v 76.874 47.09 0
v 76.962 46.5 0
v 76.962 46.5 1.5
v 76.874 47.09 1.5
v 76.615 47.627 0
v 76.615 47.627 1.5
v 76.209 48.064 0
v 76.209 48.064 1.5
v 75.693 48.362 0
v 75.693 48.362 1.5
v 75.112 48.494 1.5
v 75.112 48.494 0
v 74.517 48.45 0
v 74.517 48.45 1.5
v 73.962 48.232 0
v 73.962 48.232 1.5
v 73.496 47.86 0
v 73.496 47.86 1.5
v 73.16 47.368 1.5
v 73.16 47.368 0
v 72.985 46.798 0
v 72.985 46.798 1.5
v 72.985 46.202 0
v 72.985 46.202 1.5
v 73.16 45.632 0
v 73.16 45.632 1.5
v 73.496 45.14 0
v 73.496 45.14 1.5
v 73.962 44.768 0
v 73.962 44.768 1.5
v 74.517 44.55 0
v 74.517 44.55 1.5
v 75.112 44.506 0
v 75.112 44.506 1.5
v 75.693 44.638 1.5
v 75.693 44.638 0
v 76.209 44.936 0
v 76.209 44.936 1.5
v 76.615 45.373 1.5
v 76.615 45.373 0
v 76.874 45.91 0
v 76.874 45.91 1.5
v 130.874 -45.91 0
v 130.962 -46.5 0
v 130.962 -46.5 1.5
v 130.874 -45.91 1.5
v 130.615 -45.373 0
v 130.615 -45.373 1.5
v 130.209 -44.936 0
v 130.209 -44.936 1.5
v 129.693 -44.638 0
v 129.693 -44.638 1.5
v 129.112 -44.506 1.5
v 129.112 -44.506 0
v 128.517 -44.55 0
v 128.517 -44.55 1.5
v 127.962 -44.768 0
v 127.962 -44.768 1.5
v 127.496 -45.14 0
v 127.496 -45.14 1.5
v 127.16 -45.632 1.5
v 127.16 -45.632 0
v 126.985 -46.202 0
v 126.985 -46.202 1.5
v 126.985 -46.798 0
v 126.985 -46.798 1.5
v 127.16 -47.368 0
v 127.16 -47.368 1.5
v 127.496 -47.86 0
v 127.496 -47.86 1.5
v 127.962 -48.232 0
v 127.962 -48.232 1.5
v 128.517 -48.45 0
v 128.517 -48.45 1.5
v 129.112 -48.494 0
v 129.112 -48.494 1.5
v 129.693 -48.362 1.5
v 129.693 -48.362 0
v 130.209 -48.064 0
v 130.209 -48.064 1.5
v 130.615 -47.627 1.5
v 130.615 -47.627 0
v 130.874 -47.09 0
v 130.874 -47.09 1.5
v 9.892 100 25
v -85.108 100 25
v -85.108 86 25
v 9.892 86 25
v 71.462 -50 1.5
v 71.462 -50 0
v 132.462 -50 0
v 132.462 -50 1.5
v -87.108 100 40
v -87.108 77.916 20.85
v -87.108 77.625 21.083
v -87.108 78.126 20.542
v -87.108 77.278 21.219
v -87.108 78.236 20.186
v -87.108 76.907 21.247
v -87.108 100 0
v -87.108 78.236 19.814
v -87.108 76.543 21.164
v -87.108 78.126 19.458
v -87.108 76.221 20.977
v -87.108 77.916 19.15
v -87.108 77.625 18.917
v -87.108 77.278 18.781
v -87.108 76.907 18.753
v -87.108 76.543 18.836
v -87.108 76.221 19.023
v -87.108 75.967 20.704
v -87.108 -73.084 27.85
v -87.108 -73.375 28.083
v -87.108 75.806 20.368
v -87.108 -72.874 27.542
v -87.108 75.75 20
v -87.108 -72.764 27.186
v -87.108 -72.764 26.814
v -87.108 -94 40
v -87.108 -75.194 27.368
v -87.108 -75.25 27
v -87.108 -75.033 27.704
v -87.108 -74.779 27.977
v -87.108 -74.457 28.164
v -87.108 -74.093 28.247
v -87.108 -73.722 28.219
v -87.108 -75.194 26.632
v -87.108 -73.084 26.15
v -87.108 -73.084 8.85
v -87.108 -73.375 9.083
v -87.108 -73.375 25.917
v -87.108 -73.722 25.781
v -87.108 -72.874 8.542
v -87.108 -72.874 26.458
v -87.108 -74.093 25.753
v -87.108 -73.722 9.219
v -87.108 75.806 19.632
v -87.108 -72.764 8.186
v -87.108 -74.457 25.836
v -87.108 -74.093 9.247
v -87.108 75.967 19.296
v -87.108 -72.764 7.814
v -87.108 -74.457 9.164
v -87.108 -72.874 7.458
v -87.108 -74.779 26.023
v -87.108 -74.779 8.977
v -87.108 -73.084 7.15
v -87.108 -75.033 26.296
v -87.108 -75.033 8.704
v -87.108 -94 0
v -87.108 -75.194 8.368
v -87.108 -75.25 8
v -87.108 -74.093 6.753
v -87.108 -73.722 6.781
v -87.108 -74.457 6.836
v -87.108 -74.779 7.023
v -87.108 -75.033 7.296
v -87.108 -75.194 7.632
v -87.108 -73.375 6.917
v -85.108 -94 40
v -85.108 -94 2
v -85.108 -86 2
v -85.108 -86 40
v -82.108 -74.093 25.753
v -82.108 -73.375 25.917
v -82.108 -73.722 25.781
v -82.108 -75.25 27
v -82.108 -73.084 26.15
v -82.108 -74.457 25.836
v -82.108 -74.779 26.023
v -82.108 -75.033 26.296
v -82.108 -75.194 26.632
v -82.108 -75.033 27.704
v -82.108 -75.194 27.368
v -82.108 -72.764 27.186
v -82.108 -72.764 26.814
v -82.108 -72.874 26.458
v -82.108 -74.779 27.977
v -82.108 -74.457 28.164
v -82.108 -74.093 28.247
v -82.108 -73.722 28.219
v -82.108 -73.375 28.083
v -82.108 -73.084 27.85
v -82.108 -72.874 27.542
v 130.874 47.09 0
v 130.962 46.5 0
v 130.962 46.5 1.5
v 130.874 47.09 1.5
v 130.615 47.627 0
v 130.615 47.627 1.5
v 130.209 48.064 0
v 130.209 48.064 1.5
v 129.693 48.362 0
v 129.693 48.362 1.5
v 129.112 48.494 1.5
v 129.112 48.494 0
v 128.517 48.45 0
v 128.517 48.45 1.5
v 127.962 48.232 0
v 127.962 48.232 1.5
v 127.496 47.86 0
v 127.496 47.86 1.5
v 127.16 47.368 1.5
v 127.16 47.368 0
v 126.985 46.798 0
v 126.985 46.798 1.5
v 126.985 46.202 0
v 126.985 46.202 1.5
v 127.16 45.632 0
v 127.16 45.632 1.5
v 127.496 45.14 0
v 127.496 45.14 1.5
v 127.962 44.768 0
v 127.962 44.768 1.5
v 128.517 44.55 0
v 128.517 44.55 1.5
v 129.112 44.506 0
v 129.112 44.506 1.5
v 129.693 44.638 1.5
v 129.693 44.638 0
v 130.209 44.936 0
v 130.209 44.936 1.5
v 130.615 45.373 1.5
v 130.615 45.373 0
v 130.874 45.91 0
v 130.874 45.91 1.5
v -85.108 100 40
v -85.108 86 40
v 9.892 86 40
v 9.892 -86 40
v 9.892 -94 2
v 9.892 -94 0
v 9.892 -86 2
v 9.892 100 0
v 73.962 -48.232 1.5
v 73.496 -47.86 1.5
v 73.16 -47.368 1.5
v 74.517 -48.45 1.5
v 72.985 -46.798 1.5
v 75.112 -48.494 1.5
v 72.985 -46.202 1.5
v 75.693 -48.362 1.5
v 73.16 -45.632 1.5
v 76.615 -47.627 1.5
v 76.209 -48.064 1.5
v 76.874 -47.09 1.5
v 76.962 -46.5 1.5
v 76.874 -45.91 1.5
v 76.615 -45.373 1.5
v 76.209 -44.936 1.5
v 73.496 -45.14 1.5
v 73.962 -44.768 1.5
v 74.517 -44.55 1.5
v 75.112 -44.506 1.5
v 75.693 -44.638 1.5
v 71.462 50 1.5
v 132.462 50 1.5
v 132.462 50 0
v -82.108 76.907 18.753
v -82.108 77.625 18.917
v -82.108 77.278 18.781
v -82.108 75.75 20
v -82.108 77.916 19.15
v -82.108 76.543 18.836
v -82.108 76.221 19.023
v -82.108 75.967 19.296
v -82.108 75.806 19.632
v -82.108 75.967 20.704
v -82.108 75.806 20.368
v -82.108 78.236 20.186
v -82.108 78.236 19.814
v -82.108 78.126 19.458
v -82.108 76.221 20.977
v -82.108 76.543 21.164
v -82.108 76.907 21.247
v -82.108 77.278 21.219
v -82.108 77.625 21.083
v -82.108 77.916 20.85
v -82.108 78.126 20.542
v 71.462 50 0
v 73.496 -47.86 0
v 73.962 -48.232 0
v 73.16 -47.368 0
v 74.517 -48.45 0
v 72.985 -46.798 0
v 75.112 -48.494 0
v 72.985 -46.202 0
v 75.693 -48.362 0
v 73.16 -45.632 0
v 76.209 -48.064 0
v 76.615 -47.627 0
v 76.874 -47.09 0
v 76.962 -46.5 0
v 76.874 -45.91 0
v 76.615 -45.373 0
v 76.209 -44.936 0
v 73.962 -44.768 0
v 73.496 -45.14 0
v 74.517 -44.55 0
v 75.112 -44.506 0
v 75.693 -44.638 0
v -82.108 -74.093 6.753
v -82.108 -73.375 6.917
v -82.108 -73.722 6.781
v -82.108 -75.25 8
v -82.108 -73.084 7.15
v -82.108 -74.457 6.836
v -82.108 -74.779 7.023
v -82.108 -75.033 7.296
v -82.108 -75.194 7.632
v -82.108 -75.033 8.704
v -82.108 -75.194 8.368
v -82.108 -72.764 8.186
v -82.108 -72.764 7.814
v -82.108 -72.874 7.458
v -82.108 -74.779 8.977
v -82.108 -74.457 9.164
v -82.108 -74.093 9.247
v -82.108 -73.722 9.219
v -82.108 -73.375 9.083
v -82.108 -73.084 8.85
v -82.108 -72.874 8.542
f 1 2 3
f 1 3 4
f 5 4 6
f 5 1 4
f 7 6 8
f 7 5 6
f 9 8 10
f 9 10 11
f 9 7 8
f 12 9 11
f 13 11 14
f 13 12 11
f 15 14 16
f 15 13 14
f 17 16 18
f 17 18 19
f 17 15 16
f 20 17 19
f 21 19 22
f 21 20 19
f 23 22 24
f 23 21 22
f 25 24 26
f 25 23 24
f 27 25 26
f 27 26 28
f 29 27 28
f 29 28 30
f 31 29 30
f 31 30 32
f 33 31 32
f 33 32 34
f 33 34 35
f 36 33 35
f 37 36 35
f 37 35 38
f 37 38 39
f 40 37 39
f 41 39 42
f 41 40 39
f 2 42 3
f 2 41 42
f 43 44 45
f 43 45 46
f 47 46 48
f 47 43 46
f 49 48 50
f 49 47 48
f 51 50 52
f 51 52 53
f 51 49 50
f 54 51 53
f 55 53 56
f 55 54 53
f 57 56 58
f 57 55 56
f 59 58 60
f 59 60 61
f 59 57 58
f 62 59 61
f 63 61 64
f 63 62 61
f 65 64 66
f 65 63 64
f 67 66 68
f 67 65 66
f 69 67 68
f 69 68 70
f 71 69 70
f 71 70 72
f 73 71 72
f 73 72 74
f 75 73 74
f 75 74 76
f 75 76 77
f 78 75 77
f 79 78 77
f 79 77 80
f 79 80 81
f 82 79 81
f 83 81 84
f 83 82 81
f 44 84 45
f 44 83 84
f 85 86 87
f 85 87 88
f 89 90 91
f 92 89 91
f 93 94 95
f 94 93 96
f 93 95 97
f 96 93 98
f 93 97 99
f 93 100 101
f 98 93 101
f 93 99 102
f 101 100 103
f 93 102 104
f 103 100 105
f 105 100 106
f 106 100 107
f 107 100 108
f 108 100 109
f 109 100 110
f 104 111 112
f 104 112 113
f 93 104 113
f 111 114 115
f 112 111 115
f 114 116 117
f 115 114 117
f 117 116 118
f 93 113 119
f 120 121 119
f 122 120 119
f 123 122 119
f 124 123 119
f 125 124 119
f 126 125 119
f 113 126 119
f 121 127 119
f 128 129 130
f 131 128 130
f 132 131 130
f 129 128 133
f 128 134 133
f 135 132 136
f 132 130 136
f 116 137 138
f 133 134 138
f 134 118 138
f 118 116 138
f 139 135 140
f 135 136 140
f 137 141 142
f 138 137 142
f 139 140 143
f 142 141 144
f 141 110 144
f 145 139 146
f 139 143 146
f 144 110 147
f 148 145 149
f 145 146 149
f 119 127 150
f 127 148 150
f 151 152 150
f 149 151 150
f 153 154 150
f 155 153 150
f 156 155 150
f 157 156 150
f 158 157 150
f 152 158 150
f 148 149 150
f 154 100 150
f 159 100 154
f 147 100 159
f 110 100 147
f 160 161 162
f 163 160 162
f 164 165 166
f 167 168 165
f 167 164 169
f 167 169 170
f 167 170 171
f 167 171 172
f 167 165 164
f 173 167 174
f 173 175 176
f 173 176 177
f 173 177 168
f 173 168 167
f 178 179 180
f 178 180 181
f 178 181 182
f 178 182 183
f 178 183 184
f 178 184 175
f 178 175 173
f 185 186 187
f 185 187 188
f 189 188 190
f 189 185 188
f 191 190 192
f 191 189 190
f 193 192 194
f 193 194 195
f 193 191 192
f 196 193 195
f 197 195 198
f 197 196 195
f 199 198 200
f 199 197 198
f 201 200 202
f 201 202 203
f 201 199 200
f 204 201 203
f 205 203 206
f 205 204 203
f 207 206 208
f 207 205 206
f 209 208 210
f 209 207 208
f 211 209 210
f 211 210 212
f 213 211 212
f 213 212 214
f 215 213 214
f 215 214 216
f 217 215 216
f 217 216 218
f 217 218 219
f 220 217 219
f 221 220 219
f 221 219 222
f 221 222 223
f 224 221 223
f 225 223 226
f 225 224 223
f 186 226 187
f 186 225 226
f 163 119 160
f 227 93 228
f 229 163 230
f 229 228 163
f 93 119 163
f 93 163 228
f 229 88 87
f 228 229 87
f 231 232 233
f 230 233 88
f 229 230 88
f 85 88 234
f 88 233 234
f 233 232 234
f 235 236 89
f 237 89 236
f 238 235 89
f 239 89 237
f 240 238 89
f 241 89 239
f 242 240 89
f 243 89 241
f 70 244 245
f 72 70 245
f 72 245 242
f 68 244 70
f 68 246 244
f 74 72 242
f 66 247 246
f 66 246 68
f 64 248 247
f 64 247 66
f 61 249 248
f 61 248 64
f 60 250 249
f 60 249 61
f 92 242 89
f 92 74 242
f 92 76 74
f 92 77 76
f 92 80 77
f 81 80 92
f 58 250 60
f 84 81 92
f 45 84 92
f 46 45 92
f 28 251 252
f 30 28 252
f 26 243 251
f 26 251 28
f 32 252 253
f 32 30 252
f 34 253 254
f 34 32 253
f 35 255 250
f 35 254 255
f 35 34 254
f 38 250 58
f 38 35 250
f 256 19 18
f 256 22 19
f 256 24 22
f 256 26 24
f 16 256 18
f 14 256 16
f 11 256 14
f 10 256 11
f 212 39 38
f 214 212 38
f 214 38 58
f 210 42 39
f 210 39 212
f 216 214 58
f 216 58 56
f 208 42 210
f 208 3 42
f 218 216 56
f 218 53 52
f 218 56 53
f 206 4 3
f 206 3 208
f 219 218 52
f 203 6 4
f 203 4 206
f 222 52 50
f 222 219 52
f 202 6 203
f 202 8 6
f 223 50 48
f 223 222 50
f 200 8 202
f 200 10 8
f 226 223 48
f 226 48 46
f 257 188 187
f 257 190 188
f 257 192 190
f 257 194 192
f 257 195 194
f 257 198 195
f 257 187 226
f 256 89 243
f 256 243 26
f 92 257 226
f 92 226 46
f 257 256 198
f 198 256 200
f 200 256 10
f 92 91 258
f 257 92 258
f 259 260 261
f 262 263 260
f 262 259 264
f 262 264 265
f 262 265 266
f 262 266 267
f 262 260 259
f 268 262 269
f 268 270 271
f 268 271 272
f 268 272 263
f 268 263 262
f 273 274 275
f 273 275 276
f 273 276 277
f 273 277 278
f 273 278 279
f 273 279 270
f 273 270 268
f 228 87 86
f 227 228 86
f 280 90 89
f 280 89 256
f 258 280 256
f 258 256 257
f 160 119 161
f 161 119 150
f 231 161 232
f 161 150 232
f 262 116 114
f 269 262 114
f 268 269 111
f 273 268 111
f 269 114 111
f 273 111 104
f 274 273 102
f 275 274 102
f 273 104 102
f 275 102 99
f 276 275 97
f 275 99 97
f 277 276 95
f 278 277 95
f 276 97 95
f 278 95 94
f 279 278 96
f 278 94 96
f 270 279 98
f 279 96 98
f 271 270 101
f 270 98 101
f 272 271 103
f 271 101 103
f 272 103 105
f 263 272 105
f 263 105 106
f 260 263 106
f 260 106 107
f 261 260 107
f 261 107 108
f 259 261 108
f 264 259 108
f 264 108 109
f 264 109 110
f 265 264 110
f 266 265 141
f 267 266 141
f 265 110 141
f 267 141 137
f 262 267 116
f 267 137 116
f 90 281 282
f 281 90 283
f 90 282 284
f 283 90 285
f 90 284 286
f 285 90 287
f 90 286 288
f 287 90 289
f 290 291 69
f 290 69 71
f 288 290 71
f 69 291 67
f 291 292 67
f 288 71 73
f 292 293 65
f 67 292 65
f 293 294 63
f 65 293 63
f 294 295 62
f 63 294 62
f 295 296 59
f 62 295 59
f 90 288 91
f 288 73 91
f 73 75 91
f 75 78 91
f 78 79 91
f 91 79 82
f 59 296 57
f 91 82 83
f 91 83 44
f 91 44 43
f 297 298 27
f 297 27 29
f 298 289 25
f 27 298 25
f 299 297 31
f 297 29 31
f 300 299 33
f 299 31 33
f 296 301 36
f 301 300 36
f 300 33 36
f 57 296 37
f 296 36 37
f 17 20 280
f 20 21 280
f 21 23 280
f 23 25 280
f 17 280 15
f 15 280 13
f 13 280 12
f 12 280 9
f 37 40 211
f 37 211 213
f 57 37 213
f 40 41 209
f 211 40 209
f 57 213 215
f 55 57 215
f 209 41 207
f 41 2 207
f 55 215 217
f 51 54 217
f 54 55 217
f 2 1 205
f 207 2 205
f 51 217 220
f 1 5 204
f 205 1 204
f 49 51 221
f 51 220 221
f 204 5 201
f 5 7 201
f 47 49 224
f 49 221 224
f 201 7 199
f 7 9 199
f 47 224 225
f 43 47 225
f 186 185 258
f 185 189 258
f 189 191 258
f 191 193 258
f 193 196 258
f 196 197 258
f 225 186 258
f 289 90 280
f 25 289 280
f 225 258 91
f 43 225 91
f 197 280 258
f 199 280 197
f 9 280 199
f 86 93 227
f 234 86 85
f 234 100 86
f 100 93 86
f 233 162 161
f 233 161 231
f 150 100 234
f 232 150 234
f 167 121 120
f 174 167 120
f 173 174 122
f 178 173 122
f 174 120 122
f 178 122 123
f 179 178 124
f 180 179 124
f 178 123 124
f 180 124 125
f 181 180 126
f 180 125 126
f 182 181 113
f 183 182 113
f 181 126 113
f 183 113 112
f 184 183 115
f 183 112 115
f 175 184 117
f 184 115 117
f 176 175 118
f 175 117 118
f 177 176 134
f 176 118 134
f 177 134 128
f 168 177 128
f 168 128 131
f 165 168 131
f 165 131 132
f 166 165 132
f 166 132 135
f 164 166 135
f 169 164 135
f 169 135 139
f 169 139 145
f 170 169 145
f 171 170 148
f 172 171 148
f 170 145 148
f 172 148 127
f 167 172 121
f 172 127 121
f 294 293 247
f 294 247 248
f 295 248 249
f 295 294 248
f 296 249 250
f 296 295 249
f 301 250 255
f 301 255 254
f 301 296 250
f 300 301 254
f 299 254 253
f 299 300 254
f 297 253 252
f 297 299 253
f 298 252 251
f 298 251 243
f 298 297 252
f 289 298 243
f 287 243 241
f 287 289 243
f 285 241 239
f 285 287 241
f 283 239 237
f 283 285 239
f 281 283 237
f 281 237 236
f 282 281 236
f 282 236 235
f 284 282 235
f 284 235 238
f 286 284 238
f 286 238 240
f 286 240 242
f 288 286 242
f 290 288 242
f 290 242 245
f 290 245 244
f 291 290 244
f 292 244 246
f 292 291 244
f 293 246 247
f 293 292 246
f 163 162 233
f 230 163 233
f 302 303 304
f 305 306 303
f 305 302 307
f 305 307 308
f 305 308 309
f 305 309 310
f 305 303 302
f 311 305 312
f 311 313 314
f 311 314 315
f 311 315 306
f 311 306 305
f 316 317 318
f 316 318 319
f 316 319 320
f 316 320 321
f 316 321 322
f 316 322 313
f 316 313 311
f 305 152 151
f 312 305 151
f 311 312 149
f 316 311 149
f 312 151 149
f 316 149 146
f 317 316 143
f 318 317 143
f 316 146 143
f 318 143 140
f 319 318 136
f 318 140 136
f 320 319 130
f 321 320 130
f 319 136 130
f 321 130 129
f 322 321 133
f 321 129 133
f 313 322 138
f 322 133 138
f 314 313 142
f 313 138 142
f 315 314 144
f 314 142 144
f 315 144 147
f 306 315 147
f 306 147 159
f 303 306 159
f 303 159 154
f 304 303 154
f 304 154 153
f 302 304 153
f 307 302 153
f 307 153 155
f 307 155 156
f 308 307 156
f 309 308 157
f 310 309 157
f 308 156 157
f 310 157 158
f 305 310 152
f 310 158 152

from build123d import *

# Parameters (mm, degrees)
F0_W     = 2
F0_H     = 14
F0_H_2   = 8
F1_DEPTH = 40
F0_W_2   = 95
F2_DEPTH = 2
F3_DEPTH = 25
F4_R     = 1.25
F5_DEPTH = 5
F0_W_3   = 61
F0_H_3   = 100
F0_R     = 2
F6_DEPTH = 1.5


with BuildPart() as f1:
    # F0 (on Top) → F1 (new body)
    with BuildSketch(Plane.XY):
        Polygon((9.892429, -86), (9.892429, 86), (-85.107571, 86), (-87.107571, 86), (-87.107571, -86), (-85.107571, -86), align=None)
        with Locations((-86.107571, 93)):
            Rectangle(F0_W, F0_H)
        with Locations((-86.107571, -90)):
            Rectangle(F0_W, F0_H_2)
    extrude(amount=F1_DEPTH)

    # F0 (on Top) → F2 (join)
    with BuildSketch(Plane.XY):
        with Locations((-37.607571, -90)):
            Rectangle(F0_W_2, F0_H_2)
    extrude(amount=F2_DEPTH)

    # F0 (on Top) → F3 (join)
    with BuildSketch(Plane.XY):
        with Locations((-37.607571, 93)):
            Rectangle(F0_W_2, F0_H)
    extrude(amount=F3_DEPTH)

    # F4 (on face) → F5 (cut)
    with BuildSketch(Plane(origin=(-87.107571, 0, 0), x_dir=(0, -1, 0), z_dir=(-1, 0, 0))):
        with Locations((74, 8)):
            Circle(F4_R)
        with Locations((74, 27)):
            Circle(F4_R)
        with Locations((-77, 20)):
            Circle(F4_R)
    extrude(amount=-F5_DEPTH, mode=Mode.SUBTRACT)


with BuildPart() as f6:
    # F0 (on Top) → F6 (new body)
    with BuildSketch(Plane.XY):
        with Locations((101.962365, 0)):
            Rectangle(F0_W_3, F0_H_3)
        with Locations((74.962365, -46.5)):
            Circle(F0_R, mode=Mode.SUBTRACT)
        with Locations((128.962365, -46.5)):
            Circle(F0_R, mode=Mode.SUBTRACT)
        with Locations((74.962365, 46.5)):
            Circle(F0_R, mode=Mode.SUBTRACT)
        with Locations((128.962365, 46.5)):
            Circle(F0_R, mode=Mode.SUBTRACT)
    extrude(amount=F6_DEPTH)


solid = Compound([f1.part, f6.part])
